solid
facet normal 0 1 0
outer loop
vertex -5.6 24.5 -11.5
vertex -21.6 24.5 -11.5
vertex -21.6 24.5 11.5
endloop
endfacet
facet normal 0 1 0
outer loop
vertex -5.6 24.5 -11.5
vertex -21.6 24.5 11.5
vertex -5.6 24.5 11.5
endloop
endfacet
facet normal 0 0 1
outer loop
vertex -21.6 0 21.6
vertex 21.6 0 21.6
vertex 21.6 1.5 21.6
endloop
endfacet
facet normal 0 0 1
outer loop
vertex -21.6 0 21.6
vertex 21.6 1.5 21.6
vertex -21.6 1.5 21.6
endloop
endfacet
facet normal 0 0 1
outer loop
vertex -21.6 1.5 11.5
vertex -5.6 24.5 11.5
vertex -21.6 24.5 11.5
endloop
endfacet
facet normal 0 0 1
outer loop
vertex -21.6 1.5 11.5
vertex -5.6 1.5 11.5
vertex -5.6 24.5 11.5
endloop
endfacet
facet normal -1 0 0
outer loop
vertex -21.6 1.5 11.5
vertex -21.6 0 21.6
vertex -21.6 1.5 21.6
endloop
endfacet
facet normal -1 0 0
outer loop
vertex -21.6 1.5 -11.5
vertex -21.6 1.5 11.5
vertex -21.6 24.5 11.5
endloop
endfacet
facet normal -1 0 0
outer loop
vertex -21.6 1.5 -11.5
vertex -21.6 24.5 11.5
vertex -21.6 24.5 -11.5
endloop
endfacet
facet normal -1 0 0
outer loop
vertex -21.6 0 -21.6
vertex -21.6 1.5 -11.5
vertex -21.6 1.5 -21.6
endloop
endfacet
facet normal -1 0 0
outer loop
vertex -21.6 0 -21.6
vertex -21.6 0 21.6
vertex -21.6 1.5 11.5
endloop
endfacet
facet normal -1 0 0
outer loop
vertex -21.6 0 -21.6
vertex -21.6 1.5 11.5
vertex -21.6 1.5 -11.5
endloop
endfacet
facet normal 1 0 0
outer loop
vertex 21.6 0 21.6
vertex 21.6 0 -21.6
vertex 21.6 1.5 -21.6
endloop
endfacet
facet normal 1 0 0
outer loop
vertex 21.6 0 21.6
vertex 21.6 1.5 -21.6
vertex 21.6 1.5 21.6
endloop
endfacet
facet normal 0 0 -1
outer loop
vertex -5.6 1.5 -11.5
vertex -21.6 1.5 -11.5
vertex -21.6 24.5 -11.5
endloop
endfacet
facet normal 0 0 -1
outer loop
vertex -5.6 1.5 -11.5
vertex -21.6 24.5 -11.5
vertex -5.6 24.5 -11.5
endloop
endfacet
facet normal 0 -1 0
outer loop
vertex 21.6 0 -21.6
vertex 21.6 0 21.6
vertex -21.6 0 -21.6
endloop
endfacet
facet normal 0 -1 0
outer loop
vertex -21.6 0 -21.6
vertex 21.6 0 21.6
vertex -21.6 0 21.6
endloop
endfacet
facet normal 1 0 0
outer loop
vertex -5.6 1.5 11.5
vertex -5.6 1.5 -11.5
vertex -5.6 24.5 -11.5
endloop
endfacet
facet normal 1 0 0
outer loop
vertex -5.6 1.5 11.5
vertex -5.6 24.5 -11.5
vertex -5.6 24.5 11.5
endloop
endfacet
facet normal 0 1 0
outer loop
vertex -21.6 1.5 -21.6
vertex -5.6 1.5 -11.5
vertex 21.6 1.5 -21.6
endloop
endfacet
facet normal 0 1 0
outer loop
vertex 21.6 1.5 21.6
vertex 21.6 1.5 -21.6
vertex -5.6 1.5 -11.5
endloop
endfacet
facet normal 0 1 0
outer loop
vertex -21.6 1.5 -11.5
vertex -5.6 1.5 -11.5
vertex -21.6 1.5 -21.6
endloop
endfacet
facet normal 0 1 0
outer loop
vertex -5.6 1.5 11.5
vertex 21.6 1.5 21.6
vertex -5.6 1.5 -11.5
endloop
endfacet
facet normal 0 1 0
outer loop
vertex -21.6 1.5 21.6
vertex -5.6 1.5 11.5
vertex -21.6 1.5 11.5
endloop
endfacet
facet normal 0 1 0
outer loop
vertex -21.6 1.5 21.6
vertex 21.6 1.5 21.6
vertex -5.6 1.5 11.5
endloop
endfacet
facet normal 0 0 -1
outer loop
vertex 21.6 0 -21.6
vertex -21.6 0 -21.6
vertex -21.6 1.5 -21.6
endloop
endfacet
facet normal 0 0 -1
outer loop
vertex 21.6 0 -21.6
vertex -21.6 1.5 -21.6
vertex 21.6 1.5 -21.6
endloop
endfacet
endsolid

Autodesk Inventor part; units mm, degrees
ref_plane "YZ Plane" through (0, 0, 0) normal (1, 0, 0) x (0, 1, 0)
ref_plane "XZ Plane" through (0, 0, 0) normal (0, 1, 0) x (-1, 0, 0)
ref_plane "XY Plane" through (0, 0, 0) normal (0, 0, 1) x (1, 0, 0)
sketch "Sketch1" plane through (0, 0, 0) normal (0, 1, 0) x (-1, 0, 0)
  line L0 (-43.2, 43.2) -> (43.2, 43.2)
  line L1 (43.2, 43.2) -> (43.2, -43.2)
  line L2 (43.2, -43.2) -> (-43.2, -43.2)
  line L3 (-43.2, -43.2) -> (-43.2, 43.2)
  line L4 (-43.2, 43.2) -> (43.2, -43.2) construction
  line L5 (43.2, 43.2) -> (-43.2, -43.2) construction
  point P0 (0, 0)
  dimension "d0" = 86.4
  dimension "d1" = 86.4
extrude "Extrusion1" add sketch "Sketch1" along normal blind 3
sketch "Sketch2" plane through (0, 3, 0) normal (0, 1, 0) x (1, 0, 0)
  line L0 (-43.2, -43.2) -> (43.2, -43.2) projected
  line L1 (-43.2, -43.2) -> (-11.2, -43.2)
  line L2 (-11.2, -23) -> (-43.2, -23)
  line L3 (-43.2, -23) -> (-43.2, 23)
  line L4 (-43.2, 23) -> (-11.2, 23)
  line L5 (-11.2, 23) -> (-11.2, -23)
  line L6 (-11.2, -23) -> (-43.2, 23) construction
  line L7 (-43.2, -23) -> (-11.2, 23) construction
  point P0 (0, 0)
  point P1 (-27.2, 0)
  dimension "d5" = 46
extrude "Extrusion2" add sketch "Sketch2" along normal blind 46
scale "Scale1" factors (0.5, 0.5, 0.5) then translate (0, 0, 0) bodies 1
properties part number "DCDriver"
